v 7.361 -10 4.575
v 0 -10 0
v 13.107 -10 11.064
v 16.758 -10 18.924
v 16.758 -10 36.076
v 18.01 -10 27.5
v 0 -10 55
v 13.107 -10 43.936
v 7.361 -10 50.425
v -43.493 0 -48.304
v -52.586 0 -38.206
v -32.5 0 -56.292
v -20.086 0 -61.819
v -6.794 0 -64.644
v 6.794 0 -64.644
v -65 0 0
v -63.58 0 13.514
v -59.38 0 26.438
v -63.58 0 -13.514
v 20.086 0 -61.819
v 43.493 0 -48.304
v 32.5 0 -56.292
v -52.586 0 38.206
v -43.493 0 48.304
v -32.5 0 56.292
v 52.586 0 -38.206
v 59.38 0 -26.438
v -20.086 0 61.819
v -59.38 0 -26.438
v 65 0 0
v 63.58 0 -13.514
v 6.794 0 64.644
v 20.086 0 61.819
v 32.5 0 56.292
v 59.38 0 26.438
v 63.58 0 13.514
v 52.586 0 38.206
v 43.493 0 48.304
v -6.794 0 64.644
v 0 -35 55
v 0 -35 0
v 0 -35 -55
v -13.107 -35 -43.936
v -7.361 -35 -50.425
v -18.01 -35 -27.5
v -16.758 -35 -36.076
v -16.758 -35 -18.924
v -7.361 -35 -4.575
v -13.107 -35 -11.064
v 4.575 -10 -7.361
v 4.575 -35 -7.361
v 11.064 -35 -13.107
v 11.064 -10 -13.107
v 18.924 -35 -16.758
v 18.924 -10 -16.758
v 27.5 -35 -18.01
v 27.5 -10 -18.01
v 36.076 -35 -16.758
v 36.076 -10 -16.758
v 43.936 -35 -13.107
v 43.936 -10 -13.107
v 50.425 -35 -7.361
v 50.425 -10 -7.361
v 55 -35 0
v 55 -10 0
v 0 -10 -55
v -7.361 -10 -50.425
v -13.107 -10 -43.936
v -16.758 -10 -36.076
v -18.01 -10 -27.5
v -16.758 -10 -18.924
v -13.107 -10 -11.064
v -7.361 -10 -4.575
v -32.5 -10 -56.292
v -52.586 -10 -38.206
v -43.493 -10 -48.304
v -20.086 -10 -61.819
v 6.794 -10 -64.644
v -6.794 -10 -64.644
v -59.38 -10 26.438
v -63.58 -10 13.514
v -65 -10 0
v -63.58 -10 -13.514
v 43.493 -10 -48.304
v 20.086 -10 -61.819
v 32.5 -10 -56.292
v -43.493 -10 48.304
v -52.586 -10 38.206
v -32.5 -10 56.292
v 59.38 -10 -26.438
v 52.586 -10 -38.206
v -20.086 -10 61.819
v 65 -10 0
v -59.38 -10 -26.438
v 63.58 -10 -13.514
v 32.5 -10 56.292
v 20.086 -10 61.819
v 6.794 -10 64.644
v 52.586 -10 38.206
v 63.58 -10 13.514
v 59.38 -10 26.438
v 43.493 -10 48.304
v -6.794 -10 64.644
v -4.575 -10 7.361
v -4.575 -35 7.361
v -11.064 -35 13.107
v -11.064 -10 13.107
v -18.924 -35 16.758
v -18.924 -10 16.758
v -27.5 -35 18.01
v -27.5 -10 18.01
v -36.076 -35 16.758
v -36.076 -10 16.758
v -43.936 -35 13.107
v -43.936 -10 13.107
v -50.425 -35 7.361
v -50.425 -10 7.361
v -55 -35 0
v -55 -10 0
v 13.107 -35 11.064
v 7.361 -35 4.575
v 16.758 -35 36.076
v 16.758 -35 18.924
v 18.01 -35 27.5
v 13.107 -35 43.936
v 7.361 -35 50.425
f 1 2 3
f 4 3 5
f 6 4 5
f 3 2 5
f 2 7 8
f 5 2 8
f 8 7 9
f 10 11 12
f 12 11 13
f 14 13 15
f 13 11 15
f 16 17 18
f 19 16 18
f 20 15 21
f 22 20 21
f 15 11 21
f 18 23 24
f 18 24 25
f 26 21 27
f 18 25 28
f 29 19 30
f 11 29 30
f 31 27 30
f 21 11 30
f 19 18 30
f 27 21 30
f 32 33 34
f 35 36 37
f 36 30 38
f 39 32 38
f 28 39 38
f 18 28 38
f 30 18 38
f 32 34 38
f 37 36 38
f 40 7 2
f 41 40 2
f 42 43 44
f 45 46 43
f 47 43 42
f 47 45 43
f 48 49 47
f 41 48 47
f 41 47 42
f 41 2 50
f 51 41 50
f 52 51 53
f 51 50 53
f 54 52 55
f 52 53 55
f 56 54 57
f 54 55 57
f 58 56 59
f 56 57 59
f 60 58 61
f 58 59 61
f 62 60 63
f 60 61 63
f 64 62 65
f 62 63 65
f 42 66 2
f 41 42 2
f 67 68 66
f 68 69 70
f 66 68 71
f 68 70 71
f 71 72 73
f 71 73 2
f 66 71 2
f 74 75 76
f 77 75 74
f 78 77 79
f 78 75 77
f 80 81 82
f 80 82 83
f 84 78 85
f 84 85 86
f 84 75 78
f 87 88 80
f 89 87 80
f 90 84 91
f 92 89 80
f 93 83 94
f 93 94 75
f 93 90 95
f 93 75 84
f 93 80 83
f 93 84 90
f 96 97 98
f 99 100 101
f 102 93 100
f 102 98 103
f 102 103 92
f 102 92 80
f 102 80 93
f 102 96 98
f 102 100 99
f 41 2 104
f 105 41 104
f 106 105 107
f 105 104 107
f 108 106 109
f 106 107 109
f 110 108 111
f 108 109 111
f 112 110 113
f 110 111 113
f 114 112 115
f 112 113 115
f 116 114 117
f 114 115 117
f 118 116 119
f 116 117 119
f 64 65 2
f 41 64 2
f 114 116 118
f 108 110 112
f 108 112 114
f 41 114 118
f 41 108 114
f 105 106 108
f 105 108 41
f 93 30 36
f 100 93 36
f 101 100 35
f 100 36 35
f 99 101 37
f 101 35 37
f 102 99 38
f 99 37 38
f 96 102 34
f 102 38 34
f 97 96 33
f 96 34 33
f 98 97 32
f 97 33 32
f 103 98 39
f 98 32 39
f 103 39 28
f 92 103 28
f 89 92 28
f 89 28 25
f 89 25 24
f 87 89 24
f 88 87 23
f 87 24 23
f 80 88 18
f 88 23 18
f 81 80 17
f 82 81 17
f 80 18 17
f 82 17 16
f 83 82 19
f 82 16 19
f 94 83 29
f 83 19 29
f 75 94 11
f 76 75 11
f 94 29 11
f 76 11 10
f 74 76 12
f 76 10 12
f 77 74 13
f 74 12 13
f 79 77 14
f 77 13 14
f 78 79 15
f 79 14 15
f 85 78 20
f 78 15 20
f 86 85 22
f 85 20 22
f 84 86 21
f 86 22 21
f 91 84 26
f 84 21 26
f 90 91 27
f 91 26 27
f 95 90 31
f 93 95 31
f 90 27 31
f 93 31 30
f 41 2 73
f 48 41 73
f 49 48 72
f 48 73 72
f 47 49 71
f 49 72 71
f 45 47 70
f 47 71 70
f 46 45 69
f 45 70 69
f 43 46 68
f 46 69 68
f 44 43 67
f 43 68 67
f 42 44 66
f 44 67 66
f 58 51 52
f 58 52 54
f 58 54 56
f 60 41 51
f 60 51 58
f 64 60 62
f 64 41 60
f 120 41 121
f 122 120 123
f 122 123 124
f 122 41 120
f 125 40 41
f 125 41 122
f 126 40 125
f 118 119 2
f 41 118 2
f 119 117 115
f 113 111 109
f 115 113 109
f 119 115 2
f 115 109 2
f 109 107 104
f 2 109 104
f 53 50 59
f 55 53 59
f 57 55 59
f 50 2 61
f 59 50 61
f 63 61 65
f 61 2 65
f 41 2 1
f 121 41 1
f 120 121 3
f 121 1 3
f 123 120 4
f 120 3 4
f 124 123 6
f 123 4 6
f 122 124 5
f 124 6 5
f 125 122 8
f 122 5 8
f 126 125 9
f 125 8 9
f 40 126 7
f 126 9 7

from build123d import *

# Parameters (mm, degrees)
F0_R     = 65
F1_DEPTH = 10
F3_DEPTH = 25


with BuildPart() as f1:
    # F0 (on Front) → F1 (new body)
    with BuildSketch(Plane.XZ):
        Circle(F0_R)
    extrude(amount=F1_DEPTH)


with BuildPart() as f3:
    # F2 (on face) → F3 (new body)
    with BuildSketch(Plane.XZ.offset(10)):
        with BuildLine():
            Line((0, 55), (0, 0))
            ThreePointArc((0, 0), (18.010421, 27.5), (0, 55))
        make_face()
        with BuildLine():
            Line((55, 0), (0, 0))
            ThreePointArc((0, 0), (27.5, -18.010421), (55, 0))
        make_face()
        with BuildLine():
            Line((0, -55), (0, 0))
            ThreePointArc((0, 0), (-18.010421, -27.5), (0, -55))
        make_face()
        with BuildLine():
            Line((-55, 0), (0, 0))
            ThreePointArc((0, 0), (-27.5, 18.010421), (-55, 0))
        make_face()
    extrude(amount=F3_DEPTH)


solid = Compound([f1.part, f3.part])
